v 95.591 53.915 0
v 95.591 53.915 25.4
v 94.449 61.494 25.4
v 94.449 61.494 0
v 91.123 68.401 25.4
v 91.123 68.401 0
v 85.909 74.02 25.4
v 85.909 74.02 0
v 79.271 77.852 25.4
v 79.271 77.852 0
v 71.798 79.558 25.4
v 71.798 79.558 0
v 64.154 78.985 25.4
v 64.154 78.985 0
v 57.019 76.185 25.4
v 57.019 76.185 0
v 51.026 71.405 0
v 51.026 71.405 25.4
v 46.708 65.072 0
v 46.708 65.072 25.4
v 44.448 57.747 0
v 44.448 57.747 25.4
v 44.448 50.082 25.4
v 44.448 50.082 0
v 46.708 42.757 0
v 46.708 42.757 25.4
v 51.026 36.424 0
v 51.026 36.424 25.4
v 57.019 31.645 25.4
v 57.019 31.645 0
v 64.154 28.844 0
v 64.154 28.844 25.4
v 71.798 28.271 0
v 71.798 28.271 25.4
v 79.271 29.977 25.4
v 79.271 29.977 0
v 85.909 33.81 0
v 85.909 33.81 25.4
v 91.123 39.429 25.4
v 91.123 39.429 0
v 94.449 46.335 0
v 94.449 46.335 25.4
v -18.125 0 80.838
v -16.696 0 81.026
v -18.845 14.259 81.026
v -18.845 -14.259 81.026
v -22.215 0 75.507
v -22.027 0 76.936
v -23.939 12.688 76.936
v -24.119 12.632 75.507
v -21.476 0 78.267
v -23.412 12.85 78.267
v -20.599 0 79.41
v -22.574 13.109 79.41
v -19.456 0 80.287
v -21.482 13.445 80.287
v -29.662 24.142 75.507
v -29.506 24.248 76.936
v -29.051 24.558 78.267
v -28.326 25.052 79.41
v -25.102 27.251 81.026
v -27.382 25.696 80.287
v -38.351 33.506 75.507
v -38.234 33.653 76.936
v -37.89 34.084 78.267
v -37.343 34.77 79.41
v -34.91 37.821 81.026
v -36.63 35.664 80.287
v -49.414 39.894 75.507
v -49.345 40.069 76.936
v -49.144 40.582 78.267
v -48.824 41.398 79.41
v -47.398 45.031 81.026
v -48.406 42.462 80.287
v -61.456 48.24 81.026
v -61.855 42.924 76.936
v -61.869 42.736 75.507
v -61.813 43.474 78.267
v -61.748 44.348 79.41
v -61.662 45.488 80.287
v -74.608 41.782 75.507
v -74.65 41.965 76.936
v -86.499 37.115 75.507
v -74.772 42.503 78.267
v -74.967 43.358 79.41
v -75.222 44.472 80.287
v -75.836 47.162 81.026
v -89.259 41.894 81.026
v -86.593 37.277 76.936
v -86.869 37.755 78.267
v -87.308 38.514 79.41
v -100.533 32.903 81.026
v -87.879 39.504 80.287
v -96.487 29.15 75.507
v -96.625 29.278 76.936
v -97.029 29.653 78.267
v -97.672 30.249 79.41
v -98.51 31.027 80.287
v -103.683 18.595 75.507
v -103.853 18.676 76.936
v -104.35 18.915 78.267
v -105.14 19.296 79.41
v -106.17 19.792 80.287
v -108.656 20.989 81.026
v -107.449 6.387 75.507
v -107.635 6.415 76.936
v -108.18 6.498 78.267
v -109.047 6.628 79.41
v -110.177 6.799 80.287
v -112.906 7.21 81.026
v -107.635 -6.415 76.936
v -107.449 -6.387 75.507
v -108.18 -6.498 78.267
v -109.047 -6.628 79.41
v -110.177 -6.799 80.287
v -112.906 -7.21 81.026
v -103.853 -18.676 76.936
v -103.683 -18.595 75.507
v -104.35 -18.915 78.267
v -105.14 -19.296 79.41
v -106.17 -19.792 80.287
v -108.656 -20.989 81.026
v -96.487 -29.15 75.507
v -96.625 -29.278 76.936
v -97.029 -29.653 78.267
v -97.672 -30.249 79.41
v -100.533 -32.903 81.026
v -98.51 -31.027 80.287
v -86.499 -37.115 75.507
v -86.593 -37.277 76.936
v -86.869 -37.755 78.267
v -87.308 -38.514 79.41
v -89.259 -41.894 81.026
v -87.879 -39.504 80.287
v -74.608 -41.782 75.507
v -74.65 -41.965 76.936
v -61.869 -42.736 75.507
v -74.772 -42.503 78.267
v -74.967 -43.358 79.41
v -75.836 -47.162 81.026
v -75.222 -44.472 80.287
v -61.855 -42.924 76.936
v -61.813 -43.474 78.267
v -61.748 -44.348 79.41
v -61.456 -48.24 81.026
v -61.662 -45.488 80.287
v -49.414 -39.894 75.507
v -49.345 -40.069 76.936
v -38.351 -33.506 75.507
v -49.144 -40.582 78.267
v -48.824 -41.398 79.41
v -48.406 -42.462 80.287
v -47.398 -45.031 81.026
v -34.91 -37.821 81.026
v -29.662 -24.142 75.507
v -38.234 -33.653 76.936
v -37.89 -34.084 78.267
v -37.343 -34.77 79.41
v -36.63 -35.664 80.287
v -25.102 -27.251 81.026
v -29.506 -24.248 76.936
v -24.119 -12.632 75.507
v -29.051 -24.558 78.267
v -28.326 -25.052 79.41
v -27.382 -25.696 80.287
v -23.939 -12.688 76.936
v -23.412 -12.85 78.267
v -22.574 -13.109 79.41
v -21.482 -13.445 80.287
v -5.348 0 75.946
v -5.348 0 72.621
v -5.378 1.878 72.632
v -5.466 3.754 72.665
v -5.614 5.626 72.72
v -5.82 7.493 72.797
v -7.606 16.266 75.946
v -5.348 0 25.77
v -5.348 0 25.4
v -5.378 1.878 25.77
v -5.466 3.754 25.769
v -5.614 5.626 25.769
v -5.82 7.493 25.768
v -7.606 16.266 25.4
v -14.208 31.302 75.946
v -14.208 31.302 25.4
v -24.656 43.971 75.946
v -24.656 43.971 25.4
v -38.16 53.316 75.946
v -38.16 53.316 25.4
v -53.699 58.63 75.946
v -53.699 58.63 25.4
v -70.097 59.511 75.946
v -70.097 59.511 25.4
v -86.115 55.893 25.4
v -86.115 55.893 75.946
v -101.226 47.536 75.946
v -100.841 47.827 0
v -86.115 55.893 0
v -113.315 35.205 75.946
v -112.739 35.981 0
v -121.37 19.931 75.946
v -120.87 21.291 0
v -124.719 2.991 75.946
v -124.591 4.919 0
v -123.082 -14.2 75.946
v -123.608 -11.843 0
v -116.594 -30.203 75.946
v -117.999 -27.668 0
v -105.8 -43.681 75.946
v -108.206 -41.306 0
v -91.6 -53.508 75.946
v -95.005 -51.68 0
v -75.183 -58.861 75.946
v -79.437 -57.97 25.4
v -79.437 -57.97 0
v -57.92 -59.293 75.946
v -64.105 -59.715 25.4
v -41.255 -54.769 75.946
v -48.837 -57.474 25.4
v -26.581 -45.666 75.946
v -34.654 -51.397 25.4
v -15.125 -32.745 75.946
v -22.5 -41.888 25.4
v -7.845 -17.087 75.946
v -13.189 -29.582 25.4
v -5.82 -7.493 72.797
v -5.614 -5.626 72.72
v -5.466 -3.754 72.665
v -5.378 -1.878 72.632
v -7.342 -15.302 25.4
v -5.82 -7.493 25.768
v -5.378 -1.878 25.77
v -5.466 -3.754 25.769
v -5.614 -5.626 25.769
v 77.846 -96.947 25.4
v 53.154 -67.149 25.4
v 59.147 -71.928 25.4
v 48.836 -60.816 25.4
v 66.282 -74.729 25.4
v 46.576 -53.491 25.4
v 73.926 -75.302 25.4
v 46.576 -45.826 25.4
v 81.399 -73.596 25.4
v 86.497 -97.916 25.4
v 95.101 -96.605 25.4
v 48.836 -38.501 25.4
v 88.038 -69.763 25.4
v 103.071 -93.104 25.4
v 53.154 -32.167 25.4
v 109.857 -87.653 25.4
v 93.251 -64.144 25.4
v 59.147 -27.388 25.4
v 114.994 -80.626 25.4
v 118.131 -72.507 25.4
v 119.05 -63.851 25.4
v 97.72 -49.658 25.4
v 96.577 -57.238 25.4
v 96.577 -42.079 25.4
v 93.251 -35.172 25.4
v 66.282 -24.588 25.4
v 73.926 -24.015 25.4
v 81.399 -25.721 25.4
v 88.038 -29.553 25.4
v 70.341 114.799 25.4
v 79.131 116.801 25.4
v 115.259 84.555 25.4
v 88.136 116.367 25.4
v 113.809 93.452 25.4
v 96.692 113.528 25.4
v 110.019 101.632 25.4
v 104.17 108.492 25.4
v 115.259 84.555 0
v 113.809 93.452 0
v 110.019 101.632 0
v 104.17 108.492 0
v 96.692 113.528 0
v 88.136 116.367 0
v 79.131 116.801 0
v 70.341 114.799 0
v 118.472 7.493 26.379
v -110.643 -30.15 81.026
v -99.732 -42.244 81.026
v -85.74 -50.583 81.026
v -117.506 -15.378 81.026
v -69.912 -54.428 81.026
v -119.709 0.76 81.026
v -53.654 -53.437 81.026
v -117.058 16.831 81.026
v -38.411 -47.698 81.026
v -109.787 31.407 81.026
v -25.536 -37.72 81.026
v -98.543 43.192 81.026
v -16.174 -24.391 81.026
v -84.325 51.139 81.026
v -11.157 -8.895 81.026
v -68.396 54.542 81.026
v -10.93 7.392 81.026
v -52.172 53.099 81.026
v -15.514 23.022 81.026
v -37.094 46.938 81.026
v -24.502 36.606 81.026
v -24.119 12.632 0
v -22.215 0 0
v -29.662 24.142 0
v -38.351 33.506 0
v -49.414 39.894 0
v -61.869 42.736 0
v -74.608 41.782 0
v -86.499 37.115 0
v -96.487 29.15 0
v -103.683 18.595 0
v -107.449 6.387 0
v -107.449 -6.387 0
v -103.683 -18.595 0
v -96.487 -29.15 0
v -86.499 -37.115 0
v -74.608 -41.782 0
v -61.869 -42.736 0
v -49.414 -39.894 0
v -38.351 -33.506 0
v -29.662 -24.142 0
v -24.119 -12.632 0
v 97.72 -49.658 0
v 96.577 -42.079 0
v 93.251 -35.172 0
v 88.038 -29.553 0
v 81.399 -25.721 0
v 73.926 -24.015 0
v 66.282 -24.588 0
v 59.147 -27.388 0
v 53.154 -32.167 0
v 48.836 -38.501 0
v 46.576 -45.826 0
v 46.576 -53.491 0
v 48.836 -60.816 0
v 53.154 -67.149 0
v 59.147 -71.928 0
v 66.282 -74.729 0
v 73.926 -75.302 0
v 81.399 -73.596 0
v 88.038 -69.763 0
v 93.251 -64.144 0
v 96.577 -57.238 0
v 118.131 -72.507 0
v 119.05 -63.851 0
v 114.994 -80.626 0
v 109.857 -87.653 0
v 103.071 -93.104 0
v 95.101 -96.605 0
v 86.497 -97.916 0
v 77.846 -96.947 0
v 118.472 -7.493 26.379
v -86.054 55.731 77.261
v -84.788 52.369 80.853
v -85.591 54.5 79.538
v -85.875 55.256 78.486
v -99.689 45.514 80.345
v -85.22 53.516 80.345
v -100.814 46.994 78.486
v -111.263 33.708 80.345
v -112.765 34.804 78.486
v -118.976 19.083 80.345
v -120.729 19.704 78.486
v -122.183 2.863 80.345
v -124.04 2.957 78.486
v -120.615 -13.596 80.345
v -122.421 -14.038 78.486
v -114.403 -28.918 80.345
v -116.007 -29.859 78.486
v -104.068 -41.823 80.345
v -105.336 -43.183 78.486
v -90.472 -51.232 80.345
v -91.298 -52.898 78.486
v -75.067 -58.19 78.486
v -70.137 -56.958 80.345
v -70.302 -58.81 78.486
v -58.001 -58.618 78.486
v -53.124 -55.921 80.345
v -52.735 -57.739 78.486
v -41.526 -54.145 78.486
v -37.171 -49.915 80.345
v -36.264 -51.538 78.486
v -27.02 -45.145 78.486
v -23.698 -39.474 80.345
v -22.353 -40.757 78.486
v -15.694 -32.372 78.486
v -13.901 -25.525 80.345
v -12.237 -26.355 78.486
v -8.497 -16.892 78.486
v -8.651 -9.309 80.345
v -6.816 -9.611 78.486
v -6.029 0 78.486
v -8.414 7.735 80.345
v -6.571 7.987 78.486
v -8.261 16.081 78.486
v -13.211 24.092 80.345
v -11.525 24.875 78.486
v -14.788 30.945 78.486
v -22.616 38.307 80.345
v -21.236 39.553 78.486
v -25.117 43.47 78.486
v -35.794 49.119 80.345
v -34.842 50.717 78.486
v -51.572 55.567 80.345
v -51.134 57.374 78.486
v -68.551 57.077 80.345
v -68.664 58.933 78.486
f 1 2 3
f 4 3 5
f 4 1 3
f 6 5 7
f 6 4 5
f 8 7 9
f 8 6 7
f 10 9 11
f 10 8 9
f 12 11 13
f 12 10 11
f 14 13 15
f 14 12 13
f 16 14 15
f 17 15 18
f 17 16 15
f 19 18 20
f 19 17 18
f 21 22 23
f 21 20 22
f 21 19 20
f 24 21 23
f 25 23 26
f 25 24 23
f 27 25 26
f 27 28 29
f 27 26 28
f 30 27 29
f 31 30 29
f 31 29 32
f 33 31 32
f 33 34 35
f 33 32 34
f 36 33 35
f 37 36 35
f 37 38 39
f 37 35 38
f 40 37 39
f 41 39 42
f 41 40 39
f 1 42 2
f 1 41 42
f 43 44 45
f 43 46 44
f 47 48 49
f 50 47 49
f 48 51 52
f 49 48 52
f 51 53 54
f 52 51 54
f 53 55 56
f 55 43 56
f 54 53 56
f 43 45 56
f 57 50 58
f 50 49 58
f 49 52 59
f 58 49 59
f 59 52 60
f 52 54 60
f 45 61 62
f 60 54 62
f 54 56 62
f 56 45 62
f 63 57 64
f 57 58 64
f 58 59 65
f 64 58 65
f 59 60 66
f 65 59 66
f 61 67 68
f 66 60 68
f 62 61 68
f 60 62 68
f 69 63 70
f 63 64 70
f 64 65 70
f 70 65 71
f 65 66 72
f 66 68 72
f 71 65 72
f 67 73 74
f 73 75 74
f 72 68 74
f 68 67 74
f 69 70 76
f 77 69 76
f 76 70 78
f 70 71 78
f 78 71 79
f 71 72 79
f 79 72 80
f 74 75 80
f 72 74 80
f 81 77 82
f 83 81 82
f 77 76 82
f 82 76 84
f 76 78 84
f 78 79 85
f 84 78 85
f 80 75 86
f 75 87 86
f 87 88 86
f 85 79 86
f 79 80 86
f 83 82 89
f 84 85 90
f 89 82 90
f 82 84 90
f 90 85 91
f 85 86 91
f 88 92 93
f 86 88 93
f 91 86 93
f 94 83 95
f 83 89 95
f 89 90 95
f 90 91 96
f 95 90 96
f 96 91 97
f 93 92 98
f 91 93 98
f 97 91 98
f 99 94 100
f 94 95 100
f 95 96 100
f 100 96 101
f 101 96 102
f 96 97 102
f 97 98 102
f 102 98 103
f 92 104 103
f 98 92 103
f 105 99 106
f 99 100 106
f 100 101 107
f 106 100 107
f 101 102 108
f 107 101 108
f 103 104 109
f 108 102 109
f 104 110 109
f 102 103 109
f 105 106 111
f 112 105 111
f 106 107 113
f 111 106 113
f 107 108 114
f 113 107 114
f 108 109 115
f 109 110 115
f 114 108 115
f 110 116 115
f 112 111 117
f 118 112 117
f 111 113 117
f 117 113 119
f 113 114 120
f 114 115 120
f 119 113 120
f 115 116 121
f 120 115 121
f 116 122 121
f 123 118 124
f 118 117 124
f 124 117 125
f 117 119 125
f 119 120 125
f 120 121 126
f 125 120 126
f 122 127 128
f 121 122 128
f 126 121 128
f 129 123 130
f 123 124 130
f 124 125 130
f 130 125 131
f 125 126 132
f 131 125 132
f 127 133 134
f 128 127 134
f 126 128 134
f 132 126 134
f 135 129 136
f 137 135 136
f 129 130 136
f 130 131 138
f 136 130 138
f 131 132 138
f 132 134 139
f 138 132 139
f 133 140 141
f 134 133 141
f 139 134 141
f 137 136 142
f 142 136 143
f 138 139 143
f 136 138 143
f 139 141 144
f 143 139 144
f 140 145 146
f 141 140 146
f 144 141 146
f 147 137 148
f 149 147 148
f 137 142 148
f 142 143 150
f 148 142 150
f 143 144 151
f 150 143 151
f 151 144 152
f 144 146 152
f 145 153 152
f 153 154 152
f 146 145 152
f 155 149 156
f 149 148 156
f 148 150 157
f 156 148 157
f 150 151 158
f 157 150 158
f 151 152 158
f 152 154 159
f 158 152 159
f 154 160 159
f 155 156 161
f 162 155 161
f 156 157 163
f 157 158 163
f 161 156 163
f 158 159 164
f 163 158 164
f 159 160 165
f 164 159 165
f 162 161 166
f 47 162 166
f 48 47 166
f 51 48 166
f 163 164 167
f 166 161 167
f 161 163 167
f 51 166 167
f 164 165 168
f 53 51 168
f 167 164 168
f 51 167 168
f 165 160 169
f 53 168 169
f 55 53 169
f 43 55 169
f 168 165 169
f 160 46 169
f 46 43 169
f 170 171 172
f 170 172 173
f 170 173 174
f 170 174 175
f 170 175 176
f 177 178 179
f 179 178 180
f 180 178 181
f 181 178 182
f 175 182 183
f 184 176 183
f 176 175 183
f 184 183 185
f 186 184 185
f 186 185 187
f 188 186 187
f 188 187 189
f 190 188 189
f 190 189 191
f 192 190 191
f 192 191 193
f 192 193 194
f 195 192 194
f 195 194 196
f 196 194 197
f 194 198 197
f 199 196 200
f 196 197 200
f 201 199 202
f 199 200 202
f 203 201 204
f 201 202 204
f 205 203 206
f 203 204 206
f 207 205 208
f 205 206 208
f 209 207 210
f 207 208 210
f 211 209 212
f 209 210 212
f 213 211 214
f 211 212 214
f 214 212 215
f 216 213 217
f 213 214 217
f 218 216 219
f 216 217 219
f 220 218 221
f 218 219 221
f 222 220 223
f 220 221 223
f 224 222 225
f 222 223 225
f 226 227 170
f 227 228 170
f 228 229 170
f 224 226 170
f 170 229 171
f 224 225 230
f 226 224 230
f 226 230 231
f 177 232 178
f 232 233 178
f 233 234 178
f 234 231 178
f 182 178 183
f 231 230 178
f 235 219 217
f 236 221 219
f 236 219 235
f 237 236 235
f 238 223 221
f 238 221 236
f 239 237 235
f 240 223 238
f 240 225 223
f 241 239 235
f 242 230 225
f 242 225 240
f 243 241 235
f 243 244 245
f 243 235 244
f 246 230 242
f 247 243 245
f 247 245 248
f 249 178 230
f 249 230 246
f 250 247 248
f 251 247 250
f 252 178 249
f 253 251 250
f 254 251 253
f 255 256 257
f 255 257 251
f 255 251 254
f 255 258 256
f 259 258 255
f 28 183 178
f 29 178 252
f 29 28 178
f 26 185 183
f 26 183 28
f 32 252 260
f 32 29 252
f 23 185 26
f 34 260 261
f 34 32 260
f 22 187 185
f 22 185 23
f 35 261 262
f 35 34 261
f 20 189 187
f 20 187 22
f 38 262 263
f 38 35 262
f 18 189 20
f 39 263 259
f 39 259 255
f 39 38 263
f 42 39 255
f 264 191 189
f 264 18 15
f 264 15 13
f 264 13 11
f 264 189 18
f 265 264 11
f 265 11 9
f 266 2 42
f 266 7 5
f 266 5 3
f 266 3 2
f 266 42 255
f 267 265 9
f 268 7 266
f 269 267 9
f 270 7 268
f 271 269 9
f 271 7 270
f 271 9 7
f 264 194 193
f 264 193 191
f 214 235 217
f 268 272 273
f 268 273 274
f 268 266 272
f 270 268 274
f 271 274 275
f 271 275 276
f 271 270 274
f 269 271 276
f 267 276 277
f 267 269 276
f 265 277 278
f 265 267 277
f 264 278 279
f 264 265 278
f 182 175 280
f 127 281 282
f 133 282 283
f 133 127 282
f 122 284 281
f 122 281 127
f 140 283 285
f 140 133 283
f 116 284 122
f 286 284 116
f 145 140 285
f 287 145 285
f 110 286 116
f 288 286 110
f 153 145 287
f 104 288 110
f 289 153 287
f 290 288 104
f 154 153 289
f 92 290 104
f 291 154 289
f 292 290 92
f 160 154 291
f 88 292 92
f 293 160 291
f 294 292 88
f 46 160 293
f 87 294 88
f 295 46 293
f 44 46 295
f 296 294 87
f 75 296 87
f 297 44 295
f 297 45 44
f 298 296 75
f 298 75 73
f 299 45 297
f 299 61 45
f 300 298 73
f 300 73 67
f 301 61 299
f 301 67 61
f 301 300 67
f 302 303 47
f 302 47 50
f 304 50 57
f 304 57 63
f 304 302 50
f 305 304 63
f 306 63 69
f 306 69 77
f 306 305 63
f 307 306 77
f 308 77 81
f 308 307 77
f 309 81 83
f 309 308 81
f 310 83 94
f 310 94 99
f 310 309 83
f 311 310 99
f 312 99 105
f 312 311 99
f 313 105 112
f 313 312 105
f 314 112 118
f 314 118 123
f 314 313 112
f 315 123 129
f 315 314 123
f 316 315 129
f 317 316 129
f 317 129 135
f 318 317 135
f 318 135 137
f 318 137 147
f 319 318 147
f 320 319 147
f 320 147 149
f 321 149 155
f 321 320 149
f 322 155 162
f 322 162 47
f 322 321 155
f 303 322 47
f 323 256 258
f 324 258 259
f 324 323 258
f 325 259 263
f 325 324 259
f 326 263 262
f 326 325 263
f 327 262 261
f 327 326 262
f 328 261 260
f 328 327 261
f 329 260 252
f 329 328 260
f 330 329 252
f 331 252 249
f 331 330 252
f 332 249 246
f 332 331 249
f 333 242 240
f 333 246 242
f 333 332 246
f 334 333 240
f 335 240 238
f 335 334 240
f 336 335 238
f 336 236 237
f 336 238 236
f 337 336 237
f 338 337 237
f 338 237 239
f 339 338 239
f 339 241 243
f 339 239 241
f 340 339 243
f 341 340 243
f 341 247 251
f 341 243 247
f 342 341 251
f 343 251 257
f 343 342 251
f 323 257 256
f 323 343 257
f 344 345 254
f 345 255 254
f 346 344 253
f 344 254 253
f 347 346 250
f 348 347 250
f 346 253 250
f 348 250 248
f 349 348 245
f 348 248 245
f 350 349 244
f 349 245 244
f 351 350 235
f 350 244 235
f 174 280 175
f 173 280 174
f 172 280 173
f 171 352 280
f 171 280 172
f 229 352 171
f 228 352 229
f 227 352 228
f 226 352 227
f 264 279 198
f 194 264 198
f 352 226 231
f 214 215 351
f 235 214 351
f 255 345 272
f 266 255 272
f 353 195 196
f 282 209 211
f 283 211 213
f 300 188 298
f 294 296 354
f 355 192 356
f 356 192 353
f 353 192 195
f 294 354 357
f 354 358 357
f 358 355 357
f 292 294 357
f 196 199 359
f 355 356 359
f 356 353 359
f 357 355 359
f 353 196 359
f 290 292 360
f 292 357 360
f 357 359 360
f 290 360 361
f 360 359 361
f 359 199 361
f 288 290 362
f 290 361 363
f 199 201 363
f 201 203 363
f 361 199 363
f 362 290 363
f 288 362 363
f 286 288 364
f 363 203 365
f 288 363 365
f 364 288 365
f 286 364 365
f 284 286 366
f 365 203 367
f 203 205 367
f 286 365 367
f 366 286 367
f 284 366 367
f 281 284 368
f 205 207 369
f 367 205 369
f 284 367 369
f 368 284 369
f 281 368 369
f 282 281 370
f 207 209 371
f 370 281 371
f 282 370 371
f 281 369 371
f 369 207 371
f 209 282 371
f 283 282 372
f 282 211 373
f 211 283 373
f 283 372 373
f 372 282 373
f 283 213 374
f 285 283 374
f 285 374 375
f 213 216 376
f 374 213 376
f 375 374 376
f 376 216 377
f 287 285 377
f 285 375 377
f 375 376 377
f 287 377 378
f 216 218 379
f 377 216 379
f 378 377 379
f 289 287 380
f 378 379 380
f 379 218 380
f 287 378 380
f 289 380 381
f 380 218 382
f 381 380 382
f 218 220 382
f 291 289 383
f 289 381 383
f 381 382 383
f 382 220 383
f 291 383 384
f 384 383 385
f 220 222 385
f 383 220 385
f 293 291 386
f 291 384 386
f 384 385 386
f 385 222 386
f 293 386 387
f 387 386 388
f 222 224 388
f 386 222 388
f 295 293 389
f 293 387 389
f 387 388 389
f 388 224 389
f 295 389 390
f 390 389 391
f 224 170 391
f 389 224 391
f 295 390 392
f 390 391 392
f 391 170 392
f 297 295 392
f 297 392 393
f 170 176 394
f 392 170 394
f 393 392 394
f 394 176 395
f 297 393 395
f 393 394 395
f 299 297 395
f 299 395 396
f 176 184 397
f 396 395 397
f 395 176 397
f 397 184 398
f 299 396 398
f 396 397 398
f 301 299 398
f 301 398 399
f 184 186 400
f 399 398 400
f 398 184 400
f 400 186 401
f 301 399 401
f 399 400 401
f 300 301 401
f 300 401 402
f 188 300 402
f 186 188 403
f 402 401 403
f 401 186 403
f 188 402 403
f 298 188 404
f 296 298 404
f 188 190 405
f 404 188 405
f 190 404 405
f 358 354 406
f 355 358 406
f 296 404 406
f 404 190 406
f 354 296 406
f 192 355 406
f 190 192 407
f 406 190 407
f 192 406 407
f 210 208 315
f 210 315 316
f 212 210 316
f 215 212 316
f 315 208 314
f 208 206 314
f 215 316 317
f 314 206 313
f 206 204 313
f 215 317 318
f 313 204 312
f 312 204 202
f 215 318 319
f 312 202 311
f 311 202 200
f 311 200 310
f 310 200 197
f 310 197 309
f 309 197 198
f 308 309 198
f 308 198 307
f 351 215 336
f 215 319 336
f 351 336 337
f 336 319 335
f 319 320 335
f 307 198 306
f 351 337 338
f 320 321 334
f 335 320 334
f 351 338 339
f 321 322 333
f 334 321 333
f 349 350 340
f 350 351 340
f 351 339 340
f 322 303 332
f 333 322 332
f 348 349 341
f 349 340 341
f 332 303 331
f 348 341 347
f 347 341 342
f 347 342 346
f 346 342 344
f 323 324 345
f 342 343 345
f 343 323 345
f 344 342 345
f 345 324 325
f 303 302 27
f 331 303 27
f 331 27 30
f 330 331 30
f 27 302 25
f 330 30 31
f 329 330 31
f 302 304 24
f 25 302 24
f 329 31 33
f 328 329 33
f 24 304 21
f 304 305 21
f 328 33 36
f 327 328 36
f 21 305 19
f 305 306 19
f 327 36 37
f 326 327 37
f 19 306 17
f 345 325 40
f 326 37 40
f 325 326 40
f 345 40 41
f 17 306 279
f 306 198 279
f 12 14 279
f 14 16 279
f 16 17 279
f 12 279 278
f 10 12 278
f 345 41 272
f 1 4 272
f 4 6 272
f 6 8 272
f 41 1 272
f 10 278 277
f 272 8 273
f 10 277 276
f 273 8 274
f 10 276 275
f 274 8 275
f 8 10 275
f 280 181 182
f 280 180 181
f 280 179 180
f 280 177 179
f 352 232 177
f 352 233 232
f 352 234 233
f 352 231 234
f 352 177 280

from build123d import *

# Parameters (mm, degrees)
F0_R     = 42.8562327702
F1_DEPTH = 25.4
F2_DEPTH = 81.026
F3_R     = 33.2230738651
F4_R     = 5.5188922036
F5_R     = 5.08
F6_R     = 25.7152601394
F7_DEPTH = 59.182
F9_DEPTH = 7.493


with BuildPart() as f1:
    # F0 (on Top) → F1 (new body)
    with BuildSketch(Plane.XY):
        with BuildLine():
            ThreePointArc((-79.4371213769, -57.9695416598), (-28.2685910836, -47.036260575), (-5.3481783741, 0))
            ThreePointArc((-5.3481783741, 0), (-31.0855992866, 49.1102951098), (-86.1149848851, 55.8928198351))
            ThreePointArc((-86.1149848851, 55.8928198351), (-124.6918824332, -3.4966639305), (-79.4371213769, -57.9695416598))
        make_face()
        with Locations((-65.0712549686, 0)):
            Circle(F0_R, mode=Mode.SUBTRACT)
        with BuildLine():
            ThreePointArc((-86.1149848851, 55.8928198351), (-31.0855992866, 49.1102951098), (-5.3481783741, 0))
            ThreePointArc((-5.3481783741, 0), (-28.2685910836, -47.036260575), (-79.4371213769, -57.9695416598))
            Line((-79.4371213769, -57.9695416598), (120.1632661658, -107.4340090401))
            Line((120.1632661658, -107.4340090401), (114.0664431846, 131.2614256598))
            Line((114.0664431846, 131.2614256598), (-86.1149848851, 55.8928198351))
        make_face()
    extrude(amount=F1_DEPTH)

    # F0 (on Top) → F2 (join)
    with BuildSketch(Plane.XY):
        with BuildLine():
            ThreePointArc((-79.4371213769, -57.9695416598), (-28.2685910836, -47.036260575), (-5.3481783741, 0))
            ThreePointArc((-5.3481783741, 0), (-31.0855992866, 49.1102951098), (-86.1149848851, 55.8928198351))
            ThreePointArc((-86.1149848851, 55.8928198351), (-124.6918824332, -3.4966639305), (-79.4371213769, -57.9695416598))
        make_face()
        with Locations((-65.0712549686, 0)):
            Circle(F0_R, mode=Mode.SUBTRACT)
    extrude(amount=F2_DEPTH)

    # F3
    f3_edges = [f1.edges().sort_by_distance(p)[0] for p in [
        (120.163266, -107.434009, 12.7),
        (114.066443, 131.261426, 12.7),
    ]]
    fillet(f3_edges, radius=F3_R)

    # F4
    f4_edges = [f1.edges().sort_by_distance(p)[0] for p in [
        (-107.927488, 0, 81.026),
    ]]
    fillet(f4_edges, radius=F4_R)

    # F5
    f5_edges = [f1.edges().sort_by_distance(p)[0] for p in [
        (-44.027525, -55.89282, 81.026),
    ]]
    fillet(f5_edges, radius=F5_R)

    # F6 (on Top) → F7 (cut)
    with BuildSketch(Plane.XY):
        with Locations((72.004429996, -49.6582314372)):
            Circle(F6_R)
        with Locations((69.8762312531, 53.9146512747)):
            Circle(F6_R)
    extrude(amount=F7_DEPTH, mode=Mode.SUBTRACT)

    # F8 (on Front) → F9 (join, symmetric)
    with BuildSketch(Plane.XZ):
        Polygon((-11.3121019676, 25.740753975), (118.4722334146, 26.3785142452), (-11.3121019676, 74.8483398067), align=None)
    extrude(amount=F9_DEPTH, both=True)


solid = f1.part
